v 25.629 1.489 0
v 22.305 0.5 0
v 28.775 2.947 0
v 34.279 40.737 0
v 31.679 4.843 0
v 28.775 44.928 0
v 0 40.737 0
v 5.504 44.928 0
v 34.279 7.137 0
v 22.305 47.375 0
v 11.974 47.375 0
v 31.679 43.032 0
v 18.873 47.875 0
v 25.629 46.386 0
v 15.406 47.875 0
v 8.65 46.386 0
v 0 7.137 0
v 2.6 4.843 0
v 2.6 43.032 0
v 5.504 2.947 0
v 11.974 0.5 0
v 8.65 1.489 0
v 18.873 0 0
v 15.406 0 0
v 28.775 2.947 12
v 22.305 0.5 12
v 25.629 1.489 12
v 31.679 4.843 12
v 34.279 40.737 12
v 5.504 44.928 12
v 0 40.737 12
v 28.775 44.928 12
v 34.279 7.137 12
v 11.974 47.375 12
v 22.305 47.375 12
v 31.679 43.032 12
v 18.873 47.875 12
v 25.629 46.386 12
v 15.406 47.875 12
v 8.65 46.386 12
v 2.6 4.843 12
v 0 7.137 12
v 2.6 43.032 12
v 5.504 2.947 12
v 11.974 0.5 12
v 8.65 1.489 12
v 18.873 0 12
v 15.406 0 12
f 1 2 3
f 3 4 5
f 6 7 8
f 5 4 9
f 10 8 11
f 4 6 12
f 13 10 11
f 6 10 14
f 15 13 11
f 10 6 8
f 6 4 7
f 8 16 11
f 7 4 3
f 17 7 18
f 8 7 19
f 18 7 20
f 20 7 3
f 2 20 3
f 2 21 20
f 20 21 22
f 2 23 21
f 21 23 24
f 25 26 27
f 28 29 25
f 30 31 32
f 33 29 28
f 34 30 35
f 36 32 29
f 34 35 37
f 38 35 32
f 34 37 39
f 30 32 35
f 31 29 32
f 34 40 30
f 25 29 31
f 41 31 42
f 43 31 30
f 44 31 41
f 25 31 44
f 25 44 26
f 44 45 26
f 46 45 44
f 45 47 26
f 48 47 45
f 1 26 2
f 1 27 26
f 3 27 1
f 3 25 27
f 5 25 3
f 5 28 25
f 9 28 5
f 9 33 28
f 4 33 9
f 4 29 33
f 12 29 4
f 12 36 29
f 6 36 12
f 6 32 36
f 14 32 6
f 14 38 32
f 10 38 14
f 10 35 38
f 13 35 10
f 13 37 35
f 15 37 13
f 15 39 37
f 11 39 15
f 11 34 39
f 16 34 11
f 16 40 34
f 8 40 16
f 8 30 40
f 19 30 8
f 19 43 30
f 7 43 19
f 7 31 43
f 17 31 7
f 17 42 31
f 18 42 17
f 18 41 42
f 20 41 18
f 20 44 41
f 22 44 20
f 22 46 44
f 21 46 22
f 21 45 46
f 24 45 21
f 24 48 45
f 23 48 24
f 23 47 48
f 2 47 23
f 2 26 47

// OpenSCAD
$fn = 32;

// ----------------------------------------------------------------------
// Eccentric disc: double_d, 12 mm thick
// ----------------------------------------------------------------------

// --- parameters (mm) ---
profile_height = 12;      // extrusion height
profile_points = 24;      // points of the closed outline

profile = [[34.279, 40.737], [31.679, 43.032], [28.775, 44.928], [25.629, 46.386], [22.305, 47.375], [18.873, 47.875], [15.406, 47.875], [11.974, 47.375], [8.65, 46.386], [5.504, 44.928], [2.6, 43.032], [0, 40.737], [0, 7.137], [2.6, 4.843], [5.504, 2.947], [8.65, 1.489], [11.974, 0.5], [15.406, 0], [18.873, 0], [22.305, 0.5], [25.629, 1.489], [28.775, 2.947], [31.679, 4.843], [34.279, 7.137]];  // single closed polygon, 24 points, counter clockwise

// --- the one profile operation ---
linear_extrude(height = profile_height) polygon(points = profile);
